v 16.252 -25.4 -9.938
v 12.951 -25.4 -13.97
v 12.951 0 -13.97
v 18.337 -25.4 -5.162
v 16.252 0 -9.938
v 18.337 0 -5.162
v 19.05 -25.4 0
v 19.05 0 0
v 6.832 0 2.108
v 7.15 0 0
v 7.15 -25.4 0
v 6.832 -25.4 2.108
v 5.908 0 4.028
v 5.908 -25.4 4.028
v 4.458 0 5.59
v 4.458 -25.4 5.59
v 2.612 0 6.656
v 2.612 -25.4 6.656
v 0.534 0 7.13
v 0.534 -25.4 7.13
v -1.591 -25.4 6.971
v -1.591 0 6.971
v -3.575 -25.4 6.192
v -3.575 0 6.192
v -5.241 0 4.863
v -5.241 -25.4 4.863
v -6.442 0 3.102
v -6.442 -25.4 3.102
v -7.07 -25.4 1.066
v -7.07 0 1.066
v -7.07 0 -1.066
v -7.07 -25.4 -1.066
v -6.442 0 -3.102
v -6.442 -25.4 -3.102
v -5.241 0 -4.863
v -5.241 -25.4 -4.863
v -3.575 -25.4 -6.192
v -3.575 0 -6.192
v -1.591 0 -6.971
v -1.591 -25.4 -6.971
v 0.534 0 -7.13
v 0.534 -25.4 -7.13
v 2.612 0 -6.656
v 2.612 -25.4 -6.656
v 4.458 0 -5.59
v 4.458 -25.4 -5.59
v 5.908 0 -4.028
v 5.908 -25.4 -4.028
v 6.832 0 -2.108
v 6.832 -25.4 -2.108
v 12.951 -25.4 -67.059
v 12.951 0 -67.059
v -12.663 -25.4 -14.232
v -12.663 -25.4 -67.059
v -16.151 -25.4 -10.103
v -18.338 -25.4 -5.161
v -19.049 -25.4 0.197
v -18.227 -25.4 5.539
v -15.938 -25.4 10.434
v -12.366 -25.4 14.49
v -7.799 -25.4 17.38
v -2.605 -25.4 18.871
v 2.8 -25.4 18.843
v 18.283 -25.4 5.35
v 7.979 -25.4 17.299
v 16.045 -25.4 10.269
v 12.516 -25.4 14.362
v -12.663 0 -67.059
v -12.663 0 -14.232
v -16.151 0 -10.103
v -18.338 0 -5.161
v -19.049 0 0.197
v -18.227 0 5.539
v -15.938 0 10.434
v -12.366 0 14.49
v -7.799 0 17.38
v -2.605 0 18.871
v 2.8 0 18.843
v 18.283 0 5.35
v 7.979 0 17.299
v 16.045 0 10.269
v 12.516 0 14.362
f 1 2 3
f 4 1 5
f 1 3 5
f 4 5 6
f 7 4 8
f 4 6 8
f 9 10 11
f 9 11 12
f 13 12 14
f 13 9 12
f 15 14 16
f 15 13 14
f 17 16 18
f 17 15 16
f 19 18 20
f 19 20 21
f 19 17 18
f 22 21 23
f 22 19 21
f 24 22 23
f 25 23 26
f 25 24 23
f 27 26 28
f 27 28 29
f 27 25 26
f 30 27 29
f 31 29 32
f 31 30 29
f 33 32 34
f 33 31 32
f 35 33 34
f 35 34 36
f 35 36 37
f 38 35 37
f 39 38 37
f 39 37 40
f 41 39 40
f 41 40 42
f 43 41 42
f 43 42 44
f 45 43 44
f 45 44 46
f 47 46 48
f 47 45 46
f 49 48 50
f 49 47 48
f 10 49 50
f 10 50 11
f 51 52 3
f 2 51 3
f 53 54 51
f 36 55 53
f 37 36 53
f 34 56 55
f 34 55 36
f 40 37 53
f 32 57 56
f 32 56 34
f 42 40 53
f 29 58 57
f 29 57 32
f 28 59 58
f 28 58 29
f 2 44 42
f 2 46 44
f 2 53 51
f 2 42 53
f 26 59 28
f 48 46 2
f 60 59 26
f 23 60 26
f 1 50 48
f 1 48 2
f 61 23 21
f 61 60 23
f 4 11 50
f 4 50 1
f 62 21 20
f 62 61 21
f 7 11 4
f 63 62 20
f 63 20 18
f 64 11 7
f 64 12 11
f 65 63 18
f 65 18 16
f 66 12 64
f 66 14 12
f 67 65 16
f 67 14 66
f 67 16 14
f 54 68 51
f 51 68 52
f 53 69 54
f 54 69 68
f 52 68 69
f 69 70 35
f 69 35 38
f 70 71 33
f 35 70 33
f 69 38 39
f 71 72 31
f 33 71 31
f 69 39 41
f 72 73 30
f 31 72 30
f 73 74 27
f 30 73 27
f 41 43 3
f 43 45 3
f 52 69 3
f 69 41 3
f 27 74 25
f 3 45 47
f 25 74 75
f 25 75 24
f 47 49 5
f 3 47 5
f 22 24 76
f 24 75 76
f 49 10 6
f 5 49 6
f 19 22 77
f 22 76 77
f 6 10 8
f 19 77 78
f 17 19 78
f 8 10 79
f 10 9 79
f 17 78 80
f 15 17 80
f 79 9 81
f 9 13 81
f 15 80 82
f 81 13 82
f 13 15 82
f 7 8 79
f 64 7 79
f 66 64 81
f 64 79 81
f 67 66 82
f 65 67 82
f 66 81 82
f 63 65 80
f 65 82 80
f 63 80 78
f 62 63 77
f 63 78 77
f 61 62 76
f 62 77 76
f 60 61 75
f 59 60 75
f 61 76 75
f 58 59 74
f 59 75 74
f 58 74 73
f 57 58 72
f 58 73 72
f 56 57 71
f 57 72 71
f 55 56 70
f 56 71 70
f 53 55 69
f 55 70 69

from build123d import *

# Parameters (mm, degrees)
F0_R     = 7.1501
F1_DEPTH = 25.4


with BuildPart() as f1:
    # F0 (on Front) → F1 (new body)
    with BuildSketch(Plane.XZ):
        with BuildLine():
            ThreePointArc((12.951258, -13.970234), (17.458865, -7.621714), (19.05, 0))
            ThreePointArc((19.05, 0), (-7.799478, 17.380179), (-12.663453, -14.231636))
            ThreePointArc((-12.663453, -14.231636), (0.194398, -19.049008), (12.951258, -13.970234))
        make_face()
        Circle(F0_R, mode=Mode.SUBTRACT)
        with BuildLine():
            ThreePointArc((12.951258, -13.970234), (0.194398, -19.049008), (-12.663453, -14.231636))
            Line((-12.663453, -14.231636), (-12.663453, -19.05))
            Line((-12.663453, -19.05), (-12.663453, -67.058742))
            Line((-12.663453, -67.058742), (12.951258, -67.058742))
            Line((12.951258, -67.058742), (12.951258, -13.970234))
        make_face()
    extrude(amount=F1_DEPTH)


solid = f1.part
